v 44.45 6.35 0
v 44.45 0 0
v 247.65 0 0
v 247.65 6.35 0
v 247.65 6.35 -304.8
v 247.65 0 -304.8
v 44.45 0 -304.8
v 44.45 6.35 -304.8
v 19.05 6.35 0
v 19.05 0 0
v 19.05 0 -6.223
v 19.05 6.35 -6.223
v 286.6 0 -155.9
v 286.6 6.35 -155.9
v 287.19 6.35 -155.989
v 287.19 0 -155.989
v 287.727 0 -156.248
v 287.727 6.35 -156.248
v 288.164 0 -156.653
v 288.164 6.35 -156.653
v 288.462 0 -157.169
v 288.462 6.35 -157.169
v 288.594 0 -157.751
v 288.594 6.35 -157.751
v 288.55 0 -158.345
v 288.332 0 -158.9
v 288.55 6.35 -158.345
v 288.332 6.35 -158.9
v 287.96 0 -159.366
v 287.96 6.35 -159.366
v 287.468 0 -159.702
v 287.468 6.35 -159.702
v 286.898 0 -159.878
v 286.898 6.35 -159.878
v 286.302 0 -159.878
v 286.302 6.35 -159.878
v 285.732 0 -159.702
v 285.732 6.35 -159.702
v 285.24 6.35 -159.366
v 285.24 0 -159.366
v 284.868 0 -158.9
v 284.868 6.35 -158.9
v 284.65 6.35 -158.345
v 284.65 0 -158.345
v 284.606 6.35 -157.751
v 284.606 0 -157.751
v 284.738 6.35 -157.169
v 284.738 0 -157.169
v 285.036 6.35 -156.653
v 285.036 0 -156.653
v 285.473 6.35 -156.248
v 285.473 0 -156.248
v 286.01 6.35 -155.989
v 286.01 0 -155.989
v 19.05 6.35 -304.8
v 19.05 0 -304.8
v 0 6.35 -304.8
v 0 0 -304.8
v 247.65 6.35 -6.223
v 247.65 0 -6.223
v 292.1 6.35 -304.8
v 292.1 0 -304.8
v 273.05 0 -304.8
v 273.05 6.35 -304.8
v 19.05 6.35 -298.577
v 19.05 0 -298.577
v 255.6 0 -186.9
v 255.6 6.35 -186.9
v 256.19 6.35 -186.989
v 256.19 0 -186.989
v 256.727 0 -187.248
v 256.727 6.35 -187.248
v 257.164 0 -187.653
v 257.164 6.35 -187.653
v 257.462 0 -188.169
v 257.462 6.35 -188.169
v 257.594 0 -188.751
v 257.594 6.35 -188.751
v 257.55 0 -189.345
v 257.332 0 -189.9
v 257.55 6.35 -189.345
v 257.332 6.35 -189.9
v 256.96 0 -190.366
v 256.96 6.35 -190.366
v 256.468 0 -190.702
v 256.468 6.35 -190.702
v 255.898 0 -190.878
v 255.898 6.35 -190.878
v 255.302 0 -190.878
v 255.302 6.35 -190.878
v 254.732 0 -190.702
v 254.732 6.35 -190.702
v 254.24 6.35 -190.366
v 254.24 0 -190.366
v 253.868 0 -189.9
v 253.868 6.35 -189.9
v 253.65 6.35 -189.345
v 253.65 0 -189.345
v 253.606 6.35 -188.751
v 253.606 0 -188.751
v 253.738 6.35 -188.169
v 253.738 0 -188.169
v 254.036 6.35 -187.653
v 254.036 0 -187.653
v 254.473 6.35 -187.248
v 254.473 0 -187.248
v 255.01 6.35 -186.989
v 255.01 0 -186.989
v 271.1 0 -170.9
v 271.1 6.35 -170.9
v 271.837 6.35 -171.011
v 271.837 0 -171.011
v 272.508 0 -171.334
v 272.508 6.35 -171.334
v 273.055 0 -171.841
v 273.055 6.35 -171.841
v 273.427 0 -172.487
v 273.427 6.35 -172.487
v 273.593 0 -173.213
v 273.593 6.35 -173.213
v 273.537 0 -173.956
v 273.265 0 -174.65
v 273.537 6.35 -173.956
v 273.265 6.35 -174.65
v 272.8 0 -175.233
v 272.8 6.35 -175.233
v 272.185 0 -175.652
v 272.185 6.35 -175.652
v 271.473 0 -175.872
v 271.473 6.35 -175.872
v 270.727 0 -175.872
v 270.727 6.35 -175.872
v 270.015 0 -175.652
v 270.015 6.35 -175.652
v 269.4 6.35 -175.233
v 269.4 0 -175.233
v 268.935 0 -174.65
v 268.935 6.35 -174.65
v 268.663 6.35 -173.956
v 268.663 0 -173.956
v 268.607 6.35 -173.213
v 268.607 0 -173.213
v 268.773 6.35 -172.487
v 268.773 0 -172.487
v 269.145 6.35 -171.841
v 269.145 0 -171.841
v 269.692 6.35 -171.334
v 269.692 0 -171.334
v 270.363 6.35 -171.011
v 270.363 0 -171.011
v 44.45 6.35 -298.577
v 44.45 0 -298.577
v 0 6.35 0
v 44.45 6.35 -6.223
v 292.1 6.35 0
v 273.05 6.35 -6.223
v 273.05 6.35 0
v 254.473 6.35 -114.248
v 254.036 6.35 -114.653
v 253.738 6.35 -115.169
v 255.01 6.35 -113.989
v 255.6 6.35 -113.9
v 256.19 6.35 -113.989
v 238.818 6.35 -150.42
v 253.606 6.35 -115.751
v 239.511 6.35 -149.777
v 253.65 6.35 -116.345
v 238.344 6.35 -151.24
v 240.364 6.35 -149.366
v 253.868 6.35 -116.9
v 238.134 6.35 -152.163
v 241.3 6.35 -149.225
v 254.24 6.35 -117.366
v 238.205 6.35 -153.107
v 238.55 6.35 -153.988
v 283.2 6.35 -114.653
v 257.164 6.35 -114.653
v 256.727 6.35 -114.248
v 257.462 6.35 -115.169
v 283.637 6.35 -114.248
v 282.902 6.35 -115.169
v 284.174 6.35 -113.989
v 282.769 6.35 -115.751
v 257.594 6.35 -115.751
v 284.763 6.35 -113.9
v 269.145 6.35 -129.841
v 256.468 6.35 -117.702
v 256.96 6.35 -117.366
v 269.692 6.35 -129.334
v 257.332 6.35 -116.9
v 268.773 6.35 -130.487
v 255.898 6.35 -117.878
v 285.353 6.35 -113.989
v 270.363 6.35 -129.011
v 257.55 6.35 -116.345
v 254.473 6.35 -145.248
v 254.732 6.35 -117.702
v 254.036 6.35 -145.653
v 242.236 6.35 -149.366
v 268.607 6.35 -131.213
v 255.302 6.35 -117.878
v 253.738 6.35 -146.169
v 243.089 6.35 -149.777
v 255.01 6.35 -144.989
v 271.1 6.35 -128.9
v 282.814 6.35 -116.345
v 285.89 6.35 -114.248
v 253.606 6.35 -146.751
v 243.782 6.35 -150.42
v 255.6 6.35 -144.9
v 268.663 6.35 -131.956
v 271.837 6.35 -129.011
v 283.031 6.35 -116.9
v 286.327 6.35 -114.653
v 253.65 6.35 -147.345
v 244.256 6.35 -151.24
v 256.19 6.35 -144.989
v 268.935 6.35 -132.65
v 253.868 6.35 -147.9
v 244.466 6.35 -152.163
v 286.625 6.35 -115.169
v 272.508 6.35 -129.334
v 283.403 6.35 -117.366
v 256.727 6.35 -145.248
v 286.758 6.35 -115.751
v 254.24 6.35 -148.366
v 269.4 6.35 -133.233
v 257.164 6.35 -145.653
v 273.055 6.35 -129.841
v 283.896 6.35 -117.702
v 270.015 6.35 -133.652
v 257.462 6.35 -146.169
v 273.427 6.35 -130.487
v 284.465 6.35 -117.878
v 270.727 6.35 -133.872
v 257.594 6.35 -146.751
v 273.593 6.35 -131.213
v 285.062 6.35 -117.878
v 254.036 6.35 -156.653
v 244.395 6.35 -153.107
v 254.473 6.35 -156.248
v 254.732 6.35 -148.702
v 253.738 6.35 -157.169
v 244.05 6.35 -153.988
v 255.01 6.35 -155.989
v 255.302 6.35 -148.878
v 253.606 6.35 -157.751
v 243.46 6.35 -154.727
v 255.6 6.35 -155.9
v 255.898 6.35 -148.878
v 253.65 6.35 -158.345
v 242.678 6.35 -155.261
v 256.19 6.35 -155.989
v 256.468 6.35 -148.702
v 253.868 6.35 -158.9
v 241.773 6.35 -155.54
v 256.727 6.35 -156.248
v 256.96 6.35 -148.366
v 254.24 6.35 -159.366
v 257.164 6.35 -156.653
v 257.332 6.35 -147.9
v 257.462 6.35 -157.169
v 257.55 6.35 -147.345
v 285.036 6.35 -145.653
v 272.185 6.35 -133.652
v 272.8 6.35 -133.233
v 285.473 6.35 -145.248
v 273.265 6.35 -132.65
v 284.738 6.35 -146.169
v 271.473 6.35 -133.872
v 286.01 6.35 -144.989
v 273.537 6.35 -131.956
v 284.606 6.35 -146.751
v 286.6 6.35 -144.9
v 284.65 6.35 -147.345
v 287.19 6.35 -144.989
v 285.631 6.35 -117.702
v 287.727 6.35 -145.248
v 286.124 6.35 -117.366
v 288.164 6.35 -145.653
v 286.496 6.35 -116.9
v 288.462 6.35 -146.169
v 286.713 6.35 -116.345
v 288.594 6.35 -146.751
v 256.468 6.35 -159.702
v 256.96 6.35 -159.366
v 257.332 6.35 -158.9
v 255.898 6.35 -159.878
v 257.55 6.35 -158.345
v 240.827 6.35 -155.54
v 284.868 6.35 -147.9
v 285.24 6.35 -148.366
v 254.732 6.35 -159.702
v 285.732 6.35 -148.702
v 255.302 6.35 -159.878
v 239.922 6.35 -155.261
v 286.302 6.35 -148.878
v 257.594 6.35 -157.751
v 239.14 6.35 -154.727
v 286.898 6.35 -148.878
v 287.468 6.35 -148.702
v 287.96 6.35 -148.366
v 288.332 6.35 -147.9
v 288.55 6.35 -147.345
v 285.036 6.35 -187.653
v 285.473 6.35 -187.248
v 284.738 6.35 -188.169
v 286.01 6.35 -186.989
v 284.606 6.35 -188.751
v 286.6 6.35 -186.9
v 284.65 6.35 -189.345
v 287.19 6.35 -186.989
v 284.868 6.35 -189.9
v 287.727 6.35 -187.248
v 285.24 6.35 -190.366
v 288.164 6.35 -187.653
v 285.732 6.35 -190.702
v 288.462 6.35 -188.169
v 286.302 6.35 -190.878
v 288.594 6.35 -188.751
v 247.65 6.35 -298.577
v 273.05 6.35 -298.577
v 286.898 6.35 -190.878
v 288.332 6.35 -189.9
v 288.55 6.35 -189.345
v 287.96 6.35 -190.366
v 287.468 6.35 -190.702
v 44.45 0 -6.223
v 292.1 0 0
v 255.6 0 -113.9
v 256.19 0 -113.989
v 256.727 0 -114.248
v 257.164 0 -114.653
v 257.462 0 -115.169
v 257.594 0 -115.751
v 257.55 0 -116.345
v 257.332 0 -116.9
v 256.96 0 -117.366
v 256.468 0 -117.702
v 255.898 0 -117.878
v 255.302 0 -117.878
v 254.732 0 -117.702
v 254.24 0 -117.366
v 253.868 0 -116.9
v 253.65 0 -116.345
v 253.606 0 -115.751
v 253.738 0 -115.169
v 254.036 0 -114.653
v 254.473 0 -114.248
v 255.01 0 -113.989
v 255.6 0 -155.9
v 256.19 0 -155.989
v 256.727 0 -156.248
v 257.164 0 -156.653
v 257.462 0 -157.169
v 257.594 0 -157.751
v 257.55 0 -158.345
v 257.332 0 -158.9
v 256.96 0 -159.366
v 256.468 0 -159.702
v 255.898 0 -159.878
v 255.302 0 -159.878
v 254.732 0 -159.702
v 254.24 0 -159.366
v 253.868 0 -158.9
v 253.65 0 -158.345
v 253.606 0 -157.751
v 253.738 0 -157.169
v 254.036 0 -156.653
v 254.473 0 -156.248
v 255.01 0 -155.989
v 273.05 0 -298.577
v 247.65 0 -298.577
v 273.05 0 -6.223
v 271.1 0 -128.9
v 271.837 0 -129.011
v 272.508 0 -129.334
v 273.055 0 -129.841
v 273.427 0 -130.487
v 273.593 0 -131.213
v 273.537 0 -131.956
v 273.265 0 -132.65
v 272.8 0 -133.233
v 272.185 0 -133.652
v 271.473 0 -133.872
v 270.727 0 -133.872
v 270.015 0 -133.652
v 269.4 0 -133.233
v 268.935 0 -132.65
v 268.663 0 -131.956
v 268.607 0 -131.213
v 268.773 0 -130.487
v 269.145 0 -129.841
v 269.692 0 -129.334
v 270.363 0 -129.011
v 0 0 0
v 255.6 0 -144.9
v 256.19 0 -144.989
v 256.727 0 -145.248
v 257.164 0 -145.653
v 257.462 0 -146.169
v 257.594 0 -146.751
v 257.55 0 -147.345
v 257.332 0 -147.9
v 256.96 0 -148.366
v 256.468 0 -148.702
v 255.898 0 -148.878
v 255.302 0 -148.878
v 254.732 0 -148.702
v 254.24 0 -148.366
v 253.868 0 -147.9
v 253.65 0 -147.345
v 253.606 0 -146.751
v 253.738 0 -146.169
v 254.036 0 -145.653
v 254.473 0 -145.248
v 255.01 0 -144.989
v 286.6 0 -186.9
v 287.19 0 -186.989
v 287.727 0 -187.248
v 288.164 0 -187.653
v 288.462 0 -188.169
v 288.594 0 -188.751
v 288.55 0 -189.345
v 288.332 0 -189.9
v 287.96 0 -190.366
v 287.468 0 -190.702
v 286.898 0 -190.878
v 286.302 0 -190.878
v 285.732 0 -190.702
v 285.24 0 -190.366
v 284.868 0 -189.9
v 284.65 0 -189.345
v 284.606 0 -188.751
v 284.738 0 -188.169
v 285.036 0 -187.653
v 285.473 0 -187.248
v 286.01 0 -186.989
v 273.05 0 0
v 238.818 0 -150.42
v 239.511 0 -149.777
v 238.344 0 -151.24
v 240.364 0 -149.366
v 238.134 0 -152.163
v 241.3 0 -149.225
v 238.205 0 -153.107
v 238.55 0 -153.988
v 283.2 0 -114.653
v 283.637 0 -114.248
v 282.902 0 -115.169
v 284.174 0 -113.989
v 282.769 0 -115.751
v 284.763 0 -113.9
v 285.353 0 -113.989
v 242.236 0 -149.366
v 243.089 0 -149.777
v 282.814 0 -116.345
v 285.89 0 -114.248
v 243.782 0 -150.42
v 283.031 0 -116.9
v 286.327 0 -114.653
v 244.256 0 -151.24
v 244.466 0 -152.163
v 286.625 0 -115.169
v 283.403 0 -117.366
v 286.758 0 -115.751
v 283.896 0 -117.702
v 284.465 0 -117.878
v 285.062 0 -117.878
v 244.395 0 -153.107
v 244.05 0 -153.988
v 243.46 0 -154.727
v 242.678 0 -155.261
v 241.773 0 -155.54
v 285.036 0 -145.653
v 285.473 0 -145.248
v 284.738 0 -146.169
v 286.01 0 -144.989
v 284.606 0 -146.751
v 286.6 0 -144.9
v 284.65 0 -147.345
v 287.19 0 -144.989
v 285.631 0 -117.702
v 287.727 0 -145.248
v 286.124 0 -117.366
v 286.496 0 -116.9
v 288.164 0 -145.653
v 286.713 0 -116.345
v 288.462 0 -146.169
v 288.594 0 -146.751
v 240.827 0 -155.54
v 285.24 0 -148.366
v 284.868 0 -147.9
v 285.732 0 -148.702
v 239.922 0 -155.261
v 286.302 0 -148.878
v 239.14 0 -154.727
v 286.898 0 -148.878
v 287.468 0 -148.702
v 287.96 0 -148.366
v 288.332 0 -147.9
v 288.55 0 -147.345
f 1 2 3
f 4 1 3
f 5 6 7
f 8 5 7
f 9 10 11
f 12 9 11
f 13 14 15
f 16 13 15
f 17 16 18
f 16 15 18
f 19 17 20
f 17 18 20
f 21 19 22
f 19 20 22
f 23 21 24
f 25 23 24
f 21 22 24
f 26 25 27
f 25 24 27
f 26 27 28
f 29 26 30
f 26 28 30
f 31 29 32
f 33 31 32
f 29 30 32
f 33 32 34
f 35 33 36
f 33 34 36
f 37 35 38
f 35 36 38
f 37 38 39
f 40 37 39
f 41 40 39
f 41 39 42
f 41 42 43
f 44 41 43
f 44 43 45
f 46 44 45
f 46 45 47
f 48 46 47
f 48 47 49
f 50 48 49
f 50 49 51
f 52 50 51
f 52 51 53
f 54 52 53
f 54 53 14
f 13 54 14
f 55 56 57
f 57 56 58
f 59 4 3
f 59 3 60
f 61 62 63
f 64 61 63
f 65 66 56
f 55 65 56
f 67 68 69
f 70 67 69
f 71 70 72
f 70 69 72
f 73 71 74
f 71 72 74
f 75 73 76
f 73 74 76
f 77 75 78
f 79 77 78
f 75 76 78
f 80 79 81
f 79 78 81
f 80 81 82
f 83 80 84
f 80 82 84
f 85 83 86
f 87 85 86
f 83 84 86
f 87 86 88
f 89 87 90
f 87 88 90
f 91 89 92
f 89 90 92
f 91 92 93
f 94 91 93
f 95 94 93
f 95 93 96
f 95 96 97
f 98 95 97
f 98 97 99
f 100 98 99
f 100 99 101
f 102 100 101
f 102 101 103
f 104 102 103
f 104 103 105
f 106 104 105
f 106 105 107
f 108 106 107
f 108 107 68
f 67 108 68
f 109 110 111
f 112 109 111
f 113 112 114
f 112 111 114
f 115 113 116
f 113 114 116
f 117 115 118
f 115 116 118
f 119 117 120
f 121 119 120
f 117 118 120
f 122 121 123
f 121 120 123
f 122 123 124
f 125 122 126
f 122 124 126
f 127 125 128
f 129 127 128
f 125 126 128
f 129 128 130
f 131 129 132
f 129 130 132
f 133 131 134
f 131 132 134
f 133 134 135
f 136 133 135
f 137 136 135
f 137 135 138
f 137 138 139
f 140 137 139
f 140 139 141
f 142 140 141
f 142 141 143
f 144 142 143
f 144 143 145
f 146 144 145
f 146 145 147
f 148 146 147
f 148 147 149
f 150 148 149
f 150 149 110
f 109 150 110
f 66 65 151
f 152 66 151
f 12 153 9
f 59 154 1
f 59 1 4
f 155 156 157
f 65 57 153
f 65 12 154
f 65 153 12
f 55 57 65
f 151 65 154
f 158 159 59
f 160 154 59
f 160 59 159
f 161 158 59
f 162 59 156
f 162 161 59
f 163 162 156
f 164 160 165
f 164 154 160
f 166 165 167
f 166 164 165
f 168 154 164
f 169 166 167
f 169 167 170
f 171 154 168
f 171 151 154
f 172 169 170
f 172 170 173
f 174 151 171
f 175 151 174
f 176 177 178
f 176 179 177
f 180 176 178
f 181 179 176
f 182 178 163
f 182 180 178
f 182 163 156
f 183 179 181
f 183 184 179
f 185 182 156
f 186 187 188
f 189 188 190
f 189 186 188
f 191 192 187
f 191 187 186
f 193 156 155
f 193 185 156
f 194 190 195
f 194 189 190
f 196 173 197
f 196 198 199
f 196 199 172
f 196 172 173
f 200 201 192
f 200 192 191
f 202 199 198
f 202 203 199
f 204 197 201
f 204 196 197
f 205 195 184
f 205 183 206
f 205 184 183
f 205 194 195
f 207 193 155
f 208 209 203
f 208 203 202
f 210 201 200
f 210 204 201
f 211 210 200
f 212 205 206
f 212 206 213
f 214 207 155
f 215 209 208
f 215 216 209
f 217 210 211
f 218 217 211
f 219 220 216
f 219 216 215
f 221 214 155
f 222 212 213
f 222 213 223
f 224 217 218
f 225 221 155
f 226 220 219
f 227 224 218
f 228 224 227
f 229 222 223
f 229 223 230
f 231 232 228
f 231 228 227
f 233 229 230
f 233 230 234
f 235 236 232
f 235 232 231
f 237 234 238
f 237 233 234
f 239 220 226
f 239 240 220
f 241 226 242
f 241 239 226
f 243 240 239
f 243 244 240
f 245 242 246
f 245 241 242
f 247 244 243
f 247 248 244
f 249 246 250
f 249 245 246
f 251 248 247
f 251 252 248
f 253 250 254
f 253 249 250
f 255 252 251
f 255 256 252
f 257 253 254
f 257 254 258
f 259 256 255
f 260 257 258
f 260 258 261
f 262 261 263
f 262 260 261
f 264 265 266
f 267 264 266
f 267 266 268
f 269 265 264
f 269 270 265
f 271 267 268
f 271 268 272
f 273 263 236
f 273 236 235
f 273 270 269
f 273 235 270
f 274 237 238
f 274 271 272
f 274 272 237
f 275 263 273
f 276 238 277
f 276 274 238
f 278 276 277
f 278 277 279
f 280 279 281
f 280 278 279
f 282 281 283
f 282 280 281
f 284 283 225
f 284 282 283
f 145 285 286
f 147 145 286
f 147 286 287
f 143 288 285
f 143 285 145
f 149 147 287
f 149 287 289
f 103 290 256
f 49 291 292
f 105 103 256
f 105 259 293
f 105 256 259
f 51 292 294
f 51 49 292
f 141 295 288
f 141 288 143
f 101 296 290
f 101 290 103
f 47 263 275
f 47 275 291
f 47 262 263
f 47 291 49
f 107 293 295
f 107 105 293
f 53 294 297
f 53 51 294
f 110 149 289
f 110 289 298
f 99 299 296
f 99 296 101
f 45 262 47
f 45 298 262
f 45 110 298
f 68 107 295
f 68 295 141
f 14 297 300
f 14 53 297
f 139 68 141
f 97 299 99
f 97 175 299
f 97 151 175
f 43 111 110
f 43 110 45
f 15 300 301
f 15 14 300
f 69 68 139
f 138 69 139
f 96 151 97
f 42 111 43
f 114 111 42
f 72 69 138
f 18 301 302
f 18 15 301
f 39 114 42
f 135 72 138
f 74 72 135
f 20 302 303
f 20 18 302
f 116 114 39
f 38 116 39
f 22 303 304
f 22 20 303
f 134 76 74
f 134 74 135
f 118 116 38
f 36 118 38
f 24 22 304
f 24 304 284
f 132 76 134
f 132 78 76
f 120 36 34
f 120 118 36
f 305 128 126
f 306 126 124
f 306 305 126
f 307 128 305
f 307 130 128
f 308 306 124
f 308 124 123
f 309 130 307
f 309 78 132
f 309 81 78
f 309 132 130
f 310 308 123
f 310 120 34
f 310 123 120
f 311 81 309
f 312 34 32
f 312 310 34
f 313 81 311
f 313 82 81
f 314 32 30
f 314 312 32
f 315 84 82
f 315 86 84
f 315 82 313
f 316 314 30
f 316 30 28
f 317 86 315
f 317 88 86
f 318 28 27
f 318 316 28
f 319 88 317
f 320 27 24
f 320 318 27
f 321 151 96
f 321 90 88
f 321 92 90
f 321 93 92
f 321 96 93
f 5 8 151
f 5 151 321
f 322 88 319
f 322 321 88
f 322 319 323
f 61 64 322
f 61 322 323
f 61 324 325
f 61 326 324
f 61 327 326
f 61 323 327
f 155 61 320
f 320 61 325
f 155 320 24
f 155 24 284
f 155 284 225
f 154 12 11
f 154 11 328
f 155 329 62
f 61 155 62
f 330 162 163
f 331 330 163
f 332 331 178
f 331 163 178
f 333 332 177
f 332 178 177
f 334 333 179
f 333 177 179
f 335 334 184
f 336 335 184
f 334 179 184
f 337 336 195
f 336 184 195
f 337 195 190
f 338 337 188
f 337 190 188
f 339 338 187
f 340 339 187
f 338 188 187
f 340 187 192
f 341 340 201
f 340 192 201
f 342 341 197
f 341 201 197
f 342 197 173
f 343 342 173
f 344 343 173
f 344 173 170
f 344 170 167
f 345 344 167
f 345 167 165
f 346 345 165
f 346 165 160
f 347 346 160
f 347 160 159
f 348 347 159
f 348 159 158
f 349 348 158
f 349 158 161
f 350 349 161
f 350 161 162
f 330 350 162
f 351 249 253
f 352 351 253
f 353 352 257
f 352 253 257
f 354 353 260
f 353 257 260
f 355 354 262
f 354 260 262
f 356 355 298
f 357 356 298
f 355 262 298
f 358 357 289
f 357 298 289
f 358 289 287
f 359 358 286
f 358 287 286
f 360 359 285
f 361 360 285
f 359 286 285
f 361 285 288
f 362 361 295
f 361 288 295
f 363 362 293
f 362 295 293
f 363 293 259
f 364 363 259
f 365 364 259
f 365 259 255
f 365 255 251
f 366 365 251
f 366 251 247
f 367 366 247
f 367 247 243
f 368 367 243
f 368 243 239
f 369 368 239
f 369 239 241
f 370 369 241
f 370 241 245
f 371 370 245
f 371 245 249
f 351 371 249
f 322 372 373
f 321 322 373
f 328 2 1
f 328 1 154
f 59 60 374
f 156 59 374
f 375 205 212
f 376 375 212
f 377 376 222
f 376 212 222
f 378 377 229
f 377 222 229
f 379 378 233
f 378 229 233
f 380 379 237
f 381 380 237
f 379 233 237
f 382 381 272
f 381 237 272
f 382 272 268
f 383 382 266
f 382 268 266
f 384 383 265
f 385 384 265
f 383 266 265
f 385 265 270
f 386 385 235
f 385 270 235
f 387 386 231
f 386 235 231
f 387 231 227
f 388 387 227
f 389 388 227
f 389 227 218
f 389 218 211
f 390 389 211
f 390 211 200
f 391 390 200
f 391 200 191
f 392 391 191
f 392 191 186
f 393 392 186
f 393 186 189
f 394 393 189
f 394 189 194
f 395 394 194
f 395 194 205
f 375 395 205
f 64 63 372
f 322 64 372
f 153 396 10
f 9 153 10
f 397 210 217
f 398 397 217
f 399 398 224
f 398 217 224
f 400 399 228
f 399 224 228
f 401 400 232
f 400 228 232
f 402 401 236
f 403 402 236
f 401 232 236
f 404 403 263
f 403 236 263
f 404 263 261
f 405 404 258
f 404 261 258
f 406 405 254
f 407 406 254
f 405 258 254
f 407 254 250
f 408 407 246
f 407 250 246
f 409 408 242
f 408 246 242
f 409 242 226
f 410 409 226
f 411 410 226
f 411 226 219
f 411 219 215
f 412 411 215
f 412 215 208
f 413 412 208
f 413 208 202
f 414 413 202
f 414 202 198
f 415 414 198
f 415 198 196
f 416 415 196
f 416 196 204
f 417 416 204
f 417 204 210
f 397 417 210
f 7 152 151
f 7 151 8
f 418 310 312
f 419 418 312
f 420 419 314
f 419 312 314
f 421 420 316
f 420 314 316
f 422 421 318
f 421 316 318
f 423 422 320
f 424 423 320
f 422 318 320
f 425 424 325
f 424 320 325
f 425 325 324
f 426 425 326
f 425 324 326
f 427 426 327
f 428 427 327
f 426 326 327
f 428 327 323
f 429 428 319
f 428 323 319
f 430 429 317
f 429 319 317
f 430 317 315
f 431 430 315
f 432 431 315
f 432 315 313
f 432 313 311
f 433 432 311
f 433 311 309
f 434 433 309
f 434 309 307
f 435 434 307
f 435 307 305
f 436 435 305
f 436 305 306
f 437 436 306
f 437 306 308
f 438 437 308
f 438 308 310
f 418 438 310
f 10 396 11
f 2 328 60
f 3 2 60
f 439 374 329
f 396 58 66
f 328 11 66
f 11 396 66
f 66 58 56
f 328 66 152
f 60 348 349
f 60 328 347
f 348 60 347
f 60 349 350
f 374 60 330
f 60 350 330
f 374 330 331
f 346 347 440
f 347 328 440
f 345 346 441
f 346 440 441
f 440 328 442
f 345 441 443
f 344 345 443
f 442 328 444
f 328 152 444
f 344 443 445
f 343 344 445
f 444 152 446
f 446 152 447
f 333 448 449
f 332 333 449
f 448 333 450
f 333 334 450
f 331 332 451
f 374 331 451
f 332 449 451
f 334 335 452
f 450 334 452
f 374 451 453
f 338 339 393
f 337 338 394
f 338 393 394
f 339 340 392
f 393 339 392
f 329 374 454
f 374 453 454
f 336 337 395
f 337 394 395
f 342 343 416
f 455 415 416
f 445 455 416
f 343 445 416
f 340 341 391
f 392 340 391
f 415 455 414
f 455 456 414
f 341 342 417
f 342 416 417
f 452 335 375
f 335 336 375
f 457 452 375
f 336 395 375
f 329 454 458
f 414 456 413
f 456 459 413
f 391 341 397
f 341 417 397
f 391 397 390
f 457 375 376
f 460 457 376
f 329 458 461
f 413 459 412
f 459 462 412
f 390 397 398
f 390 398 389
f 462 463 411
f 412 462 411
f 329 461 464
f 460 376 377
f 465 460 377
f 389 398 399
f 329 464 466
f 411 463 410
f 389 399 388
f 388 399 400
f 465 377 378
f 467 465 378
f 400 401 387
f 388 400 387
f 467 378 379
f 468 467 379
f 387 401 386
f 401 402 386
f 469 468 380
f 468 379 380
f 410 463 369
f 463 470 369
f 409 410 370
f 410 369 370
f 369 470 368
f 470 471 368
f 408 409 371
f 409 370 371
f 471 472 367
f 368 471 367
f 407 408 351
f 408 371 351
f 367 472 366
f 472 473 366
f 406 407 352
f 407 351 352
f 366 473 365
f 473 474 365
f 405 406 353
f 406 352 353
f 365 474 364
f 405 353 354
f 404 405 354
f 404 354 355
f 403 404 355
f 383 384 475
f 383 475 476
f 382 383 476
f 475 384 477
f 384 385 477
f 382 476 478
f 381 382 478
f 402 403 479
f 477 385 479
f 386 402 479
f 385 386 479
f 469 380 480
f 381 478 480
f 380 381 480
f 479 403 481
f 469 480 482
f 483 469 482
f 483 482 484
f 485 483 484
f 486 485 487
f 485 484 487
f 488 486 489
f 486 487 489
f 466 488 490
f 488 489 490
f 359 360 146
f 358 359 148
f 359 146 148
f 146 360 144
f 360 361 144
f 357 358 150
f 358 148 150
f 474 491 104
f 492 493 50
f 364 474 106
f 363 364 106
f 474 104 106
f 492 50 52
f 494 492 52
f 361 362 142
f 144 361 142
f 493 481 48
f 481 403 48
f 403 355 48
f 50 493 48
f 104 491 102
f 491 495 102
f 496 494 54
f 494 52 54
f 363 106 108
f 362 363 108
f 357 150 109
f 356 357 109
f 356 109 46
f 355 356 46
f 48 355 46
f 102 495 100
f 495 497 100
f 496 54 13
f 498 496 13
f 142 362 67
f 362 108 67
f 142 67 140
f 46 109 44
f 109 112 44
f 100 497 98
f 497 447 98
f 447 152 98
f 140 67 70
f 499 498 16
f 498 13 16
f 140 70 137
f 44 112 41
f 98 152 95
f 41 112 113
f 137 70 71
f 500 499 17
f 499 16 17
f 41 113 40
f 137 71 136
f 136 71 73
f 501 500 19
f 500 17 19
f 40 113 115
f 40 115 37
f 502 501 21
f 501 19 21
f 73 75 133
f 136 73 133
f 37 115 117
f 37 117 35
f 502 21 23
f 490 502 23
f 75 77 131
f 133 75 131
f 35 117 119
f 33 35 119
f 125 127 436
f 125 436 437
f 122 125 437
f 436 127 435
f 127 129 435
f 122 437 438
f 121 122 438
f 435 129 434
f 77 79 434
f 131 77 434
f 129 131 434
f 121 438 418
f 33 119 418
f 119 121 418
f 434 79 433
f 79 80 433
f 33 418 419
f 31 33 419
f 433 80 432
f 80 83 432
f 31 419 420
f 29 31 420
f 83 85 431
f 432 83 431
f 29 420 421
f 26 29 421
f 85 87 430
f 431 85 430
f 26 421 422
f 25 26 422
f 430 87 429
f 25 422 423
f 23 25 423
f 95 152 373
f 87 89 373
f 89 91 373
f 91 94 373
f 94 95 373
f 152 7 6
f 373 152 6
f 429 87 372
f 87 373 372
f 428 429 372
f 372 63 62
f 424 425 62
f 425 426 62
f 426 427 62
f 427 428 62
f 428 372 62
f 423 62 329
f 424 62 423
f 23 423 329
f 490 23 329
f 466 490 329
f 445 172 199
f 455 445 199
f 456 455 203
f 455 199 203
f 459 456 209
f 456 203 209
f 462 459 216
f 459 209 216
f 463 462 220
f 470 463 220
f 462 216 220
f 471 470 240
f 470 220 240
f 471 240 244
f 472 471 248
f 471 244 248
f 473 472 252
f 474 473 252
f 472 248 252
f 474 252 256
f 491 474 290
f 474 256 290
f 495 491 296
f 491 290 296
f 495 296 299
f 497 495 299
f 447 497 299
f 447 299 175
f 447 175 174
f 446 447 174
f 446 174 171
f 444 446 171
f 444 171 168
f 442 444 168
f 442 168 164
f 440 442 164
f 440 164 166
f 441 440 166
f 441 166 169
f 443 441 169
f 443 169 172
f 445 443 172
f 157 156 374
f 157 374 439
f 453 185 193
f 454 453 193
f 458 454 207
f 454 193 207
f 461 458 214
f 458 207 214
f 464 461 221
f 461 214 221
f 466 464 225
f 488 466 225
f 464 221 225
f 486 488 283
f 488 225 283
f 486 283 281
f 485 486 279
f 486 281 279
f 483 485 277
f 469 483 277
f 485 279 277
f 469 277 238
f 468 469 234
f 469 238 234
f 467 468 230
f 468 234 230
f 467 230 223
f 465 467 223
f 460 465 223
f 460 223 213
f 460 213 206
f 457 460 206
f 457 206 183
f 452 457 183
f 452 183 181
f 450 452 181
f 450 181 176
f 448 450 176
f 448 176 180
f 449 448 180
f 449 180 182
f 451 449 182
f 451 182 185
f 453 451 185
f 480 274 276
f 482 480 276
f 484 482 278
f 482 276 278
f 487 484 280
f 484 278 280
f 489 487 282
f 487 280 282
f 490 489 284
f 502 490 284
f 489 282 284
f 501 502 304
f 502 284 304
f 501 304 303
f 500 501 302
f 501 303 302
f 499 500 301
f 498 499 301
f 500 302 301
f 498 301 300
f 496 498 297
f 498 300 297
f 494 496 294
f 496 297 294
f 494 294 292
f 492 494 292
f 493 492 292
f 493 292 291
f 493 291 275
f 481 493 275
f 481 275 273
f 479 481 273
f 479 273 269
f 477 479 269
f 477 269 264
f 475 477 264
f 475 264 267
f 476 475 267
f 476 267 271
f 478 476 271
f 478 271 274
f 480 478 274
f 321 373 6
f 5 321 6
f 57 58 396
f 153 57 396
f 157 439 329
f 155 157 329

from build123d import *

# Parameters (mm, degrees)
BOSS_EXTRUDE1_DEPTH = 6.35
SKETCH4_R           = 2
SKETCH4_R_2         = 2.5
SKETCH4_R_3         = 3.175
SKETCH4_W           = 25.4
SKETCH4_H           = 6.223
CUT_EXTRUDE3_DEPTH  = 423.215315331
SKETCH5_W           = 215.9
SKETCH5_H           = 279.4
BOSS_EXTRUDE2_DEPTH = 6.35


with BuildPart() as part:
    # Sketch1 → Boss-Extrude1 (new body)
    with BuildSketch(Plane(origin=(0, 0, 0), x_dir=(1, 0, 0), z_dir=(0, 1, 0))):
        Polygon((292.1, 0), (292.1, 152.4), (228.6, 152.4), (228.6, 12.7), (12.7, 12.7), (12.7, 152.4), (0, 152.4), (0, 0), (247.65, 0), (247.65, 6.223), (273.05, 6.223), (273.05, 0), align=None)
        Polygon((228.6, 152.4), (292.1, 152.4), (292.1, 304.8), (273.05, 304.8), (273.05, 298.577), (247.65, 298.577), (247.65, 304.8), (0, 304.8), (0, 152.4), (12.7, 152.4), (12.7, 292.1), (228.6, 292.1), align=None)
    extrude(amount=BOSS_EXTRUDE1_DEPTH)

    # Sketch4 → Cut-Extrude3 (cut, through all)
    with BuildSketch(Plane(origin=(0, 6.35, 0), x_dir=(1, 0, 0), z_dir=(0, 1, 0))):
        with Locations(Location((286.6, 188.9, 0), (0, 0, 270))):
            Circle(SKETCH4_R)
        with Locations(Location((286.6, 157.9, 0), (0, 0, 270))):
            Circle(SKETCH4_R)
        with Locations(Location((255.6, 157.9, 0), (0, 0, 270))):
            Circle(SKETCH4_R)
        with Locations(Location((255.6, 188.9, 0), (0, 0, 270))):
            Circle(SKETCH4_R)
        with Locations(Location((255.6, 146.9, 0), (0, 0, 270))):
            Circle(SKETCH4_R)
        with Locations(Location((286.6, 146.9, 0), (0, 0, 270))):
            Circle(SKETCH4_R)
        with Locations(Location((284.763488048, 115.9, 0), (0, 0, 270))):
            Circle(SKETCH4_R)
        with Locations(Location((255.6, 115.9, 0), (0, 0, 270))):
            Circle(SKETCH4_R)
        with Locations(Location((271.1, 173.4, 0), (0, 0, 270))):
            Circle(SKETCH4_R_2)
        with Locations(Location((271.1, 131.4, 0), (0, 0, 270))):
            Circle(SKETCH4_R_2)
        with Locations(Location((241.3, 152.4, 0), (0, 0, 270))):
            Circle(SKETCH4_R_3)
        with Locations((260.35, 301.6885)):
            Rectangle(SKETCH4_W, SKETCH4_H)
        with Locations((260.35, 3.1115)):
            Rectangle(SKETCH4_W, SKETCH4_H)
        with Locations((31.75, 3.1115)):
            Rectangle(SKETCH4_W, SKETCH4_H)
        with Locations((31.75, 301.6885)):
            Rectangle(SKETCH4_W, SKETCH4_H)
    extrude(amount=-CUT_EXTRUDE3_DEPTH, mode=Mode.SUBTRACT)

    # Sketch5 → Boss-Extrude2 (add)
    with BuildSketch(Plane(origin=(0, 6.35, 0), x_dir=(1, 0, 0), z_dir=(0, 1, 0))):
        with Locations((120.65, 152.4)):
            Rectangle(SKETCH5_W, SKETCH5_H)
    extrude(amount=-BOSS_EXTRUDE2_DEPTH)


solid = part.part
